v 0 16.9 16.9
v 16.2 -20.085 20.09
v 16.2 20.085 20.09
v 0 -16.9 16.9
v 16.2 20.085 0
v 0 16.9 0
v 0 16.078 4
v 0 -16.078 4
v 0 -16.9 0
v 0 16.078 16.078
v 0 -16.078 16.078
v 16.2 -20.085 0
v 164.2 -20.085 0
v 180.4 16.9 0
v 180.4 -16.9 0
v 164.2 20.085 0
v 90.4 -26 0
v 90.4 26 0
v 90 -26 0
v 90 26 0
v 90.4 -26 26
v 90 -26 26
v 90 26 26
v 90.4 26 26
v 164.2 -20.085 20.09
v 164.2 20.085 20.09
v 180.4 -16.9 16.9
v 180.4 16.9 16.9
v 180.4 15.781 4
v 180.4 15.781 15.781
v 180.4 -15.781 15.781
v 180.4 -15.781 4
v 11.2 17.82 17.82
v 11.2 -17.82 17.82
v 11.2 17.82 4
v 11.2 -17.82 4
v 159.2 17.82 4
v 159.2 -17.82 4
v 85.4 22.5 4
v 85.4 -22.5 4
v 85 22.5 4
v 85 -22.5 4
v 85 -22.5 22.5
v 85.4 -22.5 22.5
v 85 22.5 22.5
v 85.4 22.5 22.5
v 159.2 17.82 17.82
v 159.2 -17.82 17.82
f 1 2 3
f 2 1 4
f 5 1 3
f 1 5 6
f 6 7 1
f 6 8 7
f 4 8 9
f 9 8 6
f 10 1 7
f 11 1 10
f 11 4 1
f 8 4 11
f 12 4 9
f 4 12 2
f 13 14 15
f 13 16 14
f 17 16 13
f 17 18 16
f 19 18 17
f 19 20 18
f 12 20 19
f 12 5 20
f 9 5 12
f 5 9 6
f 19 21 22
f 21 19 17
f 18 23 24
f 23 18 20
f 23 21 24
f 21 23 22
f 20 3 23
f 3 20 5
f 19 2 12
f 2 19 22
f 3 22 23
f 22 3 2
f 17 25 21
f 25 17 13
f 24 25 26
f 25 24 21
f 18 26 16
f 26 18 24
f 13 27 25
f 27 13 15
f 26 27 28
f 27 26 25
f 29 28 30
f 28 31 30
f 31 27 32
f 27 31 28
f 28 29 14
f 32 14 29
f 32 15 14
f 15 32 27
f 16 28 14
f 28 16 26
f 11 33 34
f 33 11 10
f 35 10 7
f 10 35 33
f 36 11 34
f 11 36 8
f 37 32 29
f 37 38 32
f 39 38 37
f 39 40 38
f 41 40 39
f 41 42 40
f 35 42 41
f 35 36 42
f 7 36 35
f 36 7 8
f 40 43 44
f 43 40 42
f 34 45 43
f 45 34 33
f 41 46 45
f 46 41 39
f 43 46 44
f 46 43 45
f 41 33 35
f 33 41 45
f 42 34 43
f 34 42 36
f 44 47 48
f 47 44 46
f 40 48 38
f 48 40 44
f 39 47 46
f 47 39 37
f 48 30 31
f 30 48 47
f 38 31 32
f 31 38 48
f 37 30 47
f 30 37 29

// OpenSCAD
$fn = 32;

// ----------------------------------------------------------------------
// Faired channel: 180 x 52 x 26 mm, 3.5 mm walls, faired ends
// ----------------------------------------------------------------------

// --- parameters (mm) ---
length = 180;             // channel length
width = 52;               // channel width at mid length
height = 26;              // channel height at mid length
wall = 3.5;               // side wall thickness
floor_t = 4;              // floor thickness
end_w = 33.8;             // faired end width
end_h = 16.9;             // faired end height

difference() {
  union() {
    hull() {
      translate([0, -16.9, 0]) cube([0.4, 33.8, 16.9]);
      translate([16.2, -20.085, 0]) cube([0.4, 40.17, 20.09]);
    }
    hull() {
      translate([16.2, -20.085, 0]) cube([0.4, 40.17, 20.09]);
      translate([90, -26, 0]) cube([0.4, 52, 26]);
    }
    hull() {
      translate([90, -26, 0]) cube([0.4, 52, 26]);
      translate([163.8, -20.085, 0]) cube([0.4, 40.17, 20.09]);
    }
    hull() {
      translate([163.8, -20.085, 0]) cube([0.4, 40.17, 20.09]);
      translate([180, -16.9, 0]) cube([0.4, 33.8, 16.9]);
    }
  }
  /* cavity, 5 mm proud of both ends so the ports are cut clean */
  hull() {
    translate([-5, -15.3, 4]) cube([0.4, 30.6, 11.3]);
    translate([11.2, -17.82, 4]) cube([0.4, 35.64, 13.82]);
  }
  hull() {
    translate([11.2, -17.82, 4]) cube([0.4, 35.64, 13.82]);
    translate([85, -22.5, 4]) cube([0.4, 45, 18.5]);
  }
  hull() {
    translate([85, -22.5, 4]) cube([0.4, 45, 18.5]);
    translate([158.8, -17.82, 4]) cube([0.4, 35.64, 13.82]);
  }
  hull() {
    translate([158.8, -17.82, 4]) cube([0.4, 35.64, 13.82]);
    translate([185, -15.3, 4]) cube([0.4, 30.6, 11.3]);
  }
}
